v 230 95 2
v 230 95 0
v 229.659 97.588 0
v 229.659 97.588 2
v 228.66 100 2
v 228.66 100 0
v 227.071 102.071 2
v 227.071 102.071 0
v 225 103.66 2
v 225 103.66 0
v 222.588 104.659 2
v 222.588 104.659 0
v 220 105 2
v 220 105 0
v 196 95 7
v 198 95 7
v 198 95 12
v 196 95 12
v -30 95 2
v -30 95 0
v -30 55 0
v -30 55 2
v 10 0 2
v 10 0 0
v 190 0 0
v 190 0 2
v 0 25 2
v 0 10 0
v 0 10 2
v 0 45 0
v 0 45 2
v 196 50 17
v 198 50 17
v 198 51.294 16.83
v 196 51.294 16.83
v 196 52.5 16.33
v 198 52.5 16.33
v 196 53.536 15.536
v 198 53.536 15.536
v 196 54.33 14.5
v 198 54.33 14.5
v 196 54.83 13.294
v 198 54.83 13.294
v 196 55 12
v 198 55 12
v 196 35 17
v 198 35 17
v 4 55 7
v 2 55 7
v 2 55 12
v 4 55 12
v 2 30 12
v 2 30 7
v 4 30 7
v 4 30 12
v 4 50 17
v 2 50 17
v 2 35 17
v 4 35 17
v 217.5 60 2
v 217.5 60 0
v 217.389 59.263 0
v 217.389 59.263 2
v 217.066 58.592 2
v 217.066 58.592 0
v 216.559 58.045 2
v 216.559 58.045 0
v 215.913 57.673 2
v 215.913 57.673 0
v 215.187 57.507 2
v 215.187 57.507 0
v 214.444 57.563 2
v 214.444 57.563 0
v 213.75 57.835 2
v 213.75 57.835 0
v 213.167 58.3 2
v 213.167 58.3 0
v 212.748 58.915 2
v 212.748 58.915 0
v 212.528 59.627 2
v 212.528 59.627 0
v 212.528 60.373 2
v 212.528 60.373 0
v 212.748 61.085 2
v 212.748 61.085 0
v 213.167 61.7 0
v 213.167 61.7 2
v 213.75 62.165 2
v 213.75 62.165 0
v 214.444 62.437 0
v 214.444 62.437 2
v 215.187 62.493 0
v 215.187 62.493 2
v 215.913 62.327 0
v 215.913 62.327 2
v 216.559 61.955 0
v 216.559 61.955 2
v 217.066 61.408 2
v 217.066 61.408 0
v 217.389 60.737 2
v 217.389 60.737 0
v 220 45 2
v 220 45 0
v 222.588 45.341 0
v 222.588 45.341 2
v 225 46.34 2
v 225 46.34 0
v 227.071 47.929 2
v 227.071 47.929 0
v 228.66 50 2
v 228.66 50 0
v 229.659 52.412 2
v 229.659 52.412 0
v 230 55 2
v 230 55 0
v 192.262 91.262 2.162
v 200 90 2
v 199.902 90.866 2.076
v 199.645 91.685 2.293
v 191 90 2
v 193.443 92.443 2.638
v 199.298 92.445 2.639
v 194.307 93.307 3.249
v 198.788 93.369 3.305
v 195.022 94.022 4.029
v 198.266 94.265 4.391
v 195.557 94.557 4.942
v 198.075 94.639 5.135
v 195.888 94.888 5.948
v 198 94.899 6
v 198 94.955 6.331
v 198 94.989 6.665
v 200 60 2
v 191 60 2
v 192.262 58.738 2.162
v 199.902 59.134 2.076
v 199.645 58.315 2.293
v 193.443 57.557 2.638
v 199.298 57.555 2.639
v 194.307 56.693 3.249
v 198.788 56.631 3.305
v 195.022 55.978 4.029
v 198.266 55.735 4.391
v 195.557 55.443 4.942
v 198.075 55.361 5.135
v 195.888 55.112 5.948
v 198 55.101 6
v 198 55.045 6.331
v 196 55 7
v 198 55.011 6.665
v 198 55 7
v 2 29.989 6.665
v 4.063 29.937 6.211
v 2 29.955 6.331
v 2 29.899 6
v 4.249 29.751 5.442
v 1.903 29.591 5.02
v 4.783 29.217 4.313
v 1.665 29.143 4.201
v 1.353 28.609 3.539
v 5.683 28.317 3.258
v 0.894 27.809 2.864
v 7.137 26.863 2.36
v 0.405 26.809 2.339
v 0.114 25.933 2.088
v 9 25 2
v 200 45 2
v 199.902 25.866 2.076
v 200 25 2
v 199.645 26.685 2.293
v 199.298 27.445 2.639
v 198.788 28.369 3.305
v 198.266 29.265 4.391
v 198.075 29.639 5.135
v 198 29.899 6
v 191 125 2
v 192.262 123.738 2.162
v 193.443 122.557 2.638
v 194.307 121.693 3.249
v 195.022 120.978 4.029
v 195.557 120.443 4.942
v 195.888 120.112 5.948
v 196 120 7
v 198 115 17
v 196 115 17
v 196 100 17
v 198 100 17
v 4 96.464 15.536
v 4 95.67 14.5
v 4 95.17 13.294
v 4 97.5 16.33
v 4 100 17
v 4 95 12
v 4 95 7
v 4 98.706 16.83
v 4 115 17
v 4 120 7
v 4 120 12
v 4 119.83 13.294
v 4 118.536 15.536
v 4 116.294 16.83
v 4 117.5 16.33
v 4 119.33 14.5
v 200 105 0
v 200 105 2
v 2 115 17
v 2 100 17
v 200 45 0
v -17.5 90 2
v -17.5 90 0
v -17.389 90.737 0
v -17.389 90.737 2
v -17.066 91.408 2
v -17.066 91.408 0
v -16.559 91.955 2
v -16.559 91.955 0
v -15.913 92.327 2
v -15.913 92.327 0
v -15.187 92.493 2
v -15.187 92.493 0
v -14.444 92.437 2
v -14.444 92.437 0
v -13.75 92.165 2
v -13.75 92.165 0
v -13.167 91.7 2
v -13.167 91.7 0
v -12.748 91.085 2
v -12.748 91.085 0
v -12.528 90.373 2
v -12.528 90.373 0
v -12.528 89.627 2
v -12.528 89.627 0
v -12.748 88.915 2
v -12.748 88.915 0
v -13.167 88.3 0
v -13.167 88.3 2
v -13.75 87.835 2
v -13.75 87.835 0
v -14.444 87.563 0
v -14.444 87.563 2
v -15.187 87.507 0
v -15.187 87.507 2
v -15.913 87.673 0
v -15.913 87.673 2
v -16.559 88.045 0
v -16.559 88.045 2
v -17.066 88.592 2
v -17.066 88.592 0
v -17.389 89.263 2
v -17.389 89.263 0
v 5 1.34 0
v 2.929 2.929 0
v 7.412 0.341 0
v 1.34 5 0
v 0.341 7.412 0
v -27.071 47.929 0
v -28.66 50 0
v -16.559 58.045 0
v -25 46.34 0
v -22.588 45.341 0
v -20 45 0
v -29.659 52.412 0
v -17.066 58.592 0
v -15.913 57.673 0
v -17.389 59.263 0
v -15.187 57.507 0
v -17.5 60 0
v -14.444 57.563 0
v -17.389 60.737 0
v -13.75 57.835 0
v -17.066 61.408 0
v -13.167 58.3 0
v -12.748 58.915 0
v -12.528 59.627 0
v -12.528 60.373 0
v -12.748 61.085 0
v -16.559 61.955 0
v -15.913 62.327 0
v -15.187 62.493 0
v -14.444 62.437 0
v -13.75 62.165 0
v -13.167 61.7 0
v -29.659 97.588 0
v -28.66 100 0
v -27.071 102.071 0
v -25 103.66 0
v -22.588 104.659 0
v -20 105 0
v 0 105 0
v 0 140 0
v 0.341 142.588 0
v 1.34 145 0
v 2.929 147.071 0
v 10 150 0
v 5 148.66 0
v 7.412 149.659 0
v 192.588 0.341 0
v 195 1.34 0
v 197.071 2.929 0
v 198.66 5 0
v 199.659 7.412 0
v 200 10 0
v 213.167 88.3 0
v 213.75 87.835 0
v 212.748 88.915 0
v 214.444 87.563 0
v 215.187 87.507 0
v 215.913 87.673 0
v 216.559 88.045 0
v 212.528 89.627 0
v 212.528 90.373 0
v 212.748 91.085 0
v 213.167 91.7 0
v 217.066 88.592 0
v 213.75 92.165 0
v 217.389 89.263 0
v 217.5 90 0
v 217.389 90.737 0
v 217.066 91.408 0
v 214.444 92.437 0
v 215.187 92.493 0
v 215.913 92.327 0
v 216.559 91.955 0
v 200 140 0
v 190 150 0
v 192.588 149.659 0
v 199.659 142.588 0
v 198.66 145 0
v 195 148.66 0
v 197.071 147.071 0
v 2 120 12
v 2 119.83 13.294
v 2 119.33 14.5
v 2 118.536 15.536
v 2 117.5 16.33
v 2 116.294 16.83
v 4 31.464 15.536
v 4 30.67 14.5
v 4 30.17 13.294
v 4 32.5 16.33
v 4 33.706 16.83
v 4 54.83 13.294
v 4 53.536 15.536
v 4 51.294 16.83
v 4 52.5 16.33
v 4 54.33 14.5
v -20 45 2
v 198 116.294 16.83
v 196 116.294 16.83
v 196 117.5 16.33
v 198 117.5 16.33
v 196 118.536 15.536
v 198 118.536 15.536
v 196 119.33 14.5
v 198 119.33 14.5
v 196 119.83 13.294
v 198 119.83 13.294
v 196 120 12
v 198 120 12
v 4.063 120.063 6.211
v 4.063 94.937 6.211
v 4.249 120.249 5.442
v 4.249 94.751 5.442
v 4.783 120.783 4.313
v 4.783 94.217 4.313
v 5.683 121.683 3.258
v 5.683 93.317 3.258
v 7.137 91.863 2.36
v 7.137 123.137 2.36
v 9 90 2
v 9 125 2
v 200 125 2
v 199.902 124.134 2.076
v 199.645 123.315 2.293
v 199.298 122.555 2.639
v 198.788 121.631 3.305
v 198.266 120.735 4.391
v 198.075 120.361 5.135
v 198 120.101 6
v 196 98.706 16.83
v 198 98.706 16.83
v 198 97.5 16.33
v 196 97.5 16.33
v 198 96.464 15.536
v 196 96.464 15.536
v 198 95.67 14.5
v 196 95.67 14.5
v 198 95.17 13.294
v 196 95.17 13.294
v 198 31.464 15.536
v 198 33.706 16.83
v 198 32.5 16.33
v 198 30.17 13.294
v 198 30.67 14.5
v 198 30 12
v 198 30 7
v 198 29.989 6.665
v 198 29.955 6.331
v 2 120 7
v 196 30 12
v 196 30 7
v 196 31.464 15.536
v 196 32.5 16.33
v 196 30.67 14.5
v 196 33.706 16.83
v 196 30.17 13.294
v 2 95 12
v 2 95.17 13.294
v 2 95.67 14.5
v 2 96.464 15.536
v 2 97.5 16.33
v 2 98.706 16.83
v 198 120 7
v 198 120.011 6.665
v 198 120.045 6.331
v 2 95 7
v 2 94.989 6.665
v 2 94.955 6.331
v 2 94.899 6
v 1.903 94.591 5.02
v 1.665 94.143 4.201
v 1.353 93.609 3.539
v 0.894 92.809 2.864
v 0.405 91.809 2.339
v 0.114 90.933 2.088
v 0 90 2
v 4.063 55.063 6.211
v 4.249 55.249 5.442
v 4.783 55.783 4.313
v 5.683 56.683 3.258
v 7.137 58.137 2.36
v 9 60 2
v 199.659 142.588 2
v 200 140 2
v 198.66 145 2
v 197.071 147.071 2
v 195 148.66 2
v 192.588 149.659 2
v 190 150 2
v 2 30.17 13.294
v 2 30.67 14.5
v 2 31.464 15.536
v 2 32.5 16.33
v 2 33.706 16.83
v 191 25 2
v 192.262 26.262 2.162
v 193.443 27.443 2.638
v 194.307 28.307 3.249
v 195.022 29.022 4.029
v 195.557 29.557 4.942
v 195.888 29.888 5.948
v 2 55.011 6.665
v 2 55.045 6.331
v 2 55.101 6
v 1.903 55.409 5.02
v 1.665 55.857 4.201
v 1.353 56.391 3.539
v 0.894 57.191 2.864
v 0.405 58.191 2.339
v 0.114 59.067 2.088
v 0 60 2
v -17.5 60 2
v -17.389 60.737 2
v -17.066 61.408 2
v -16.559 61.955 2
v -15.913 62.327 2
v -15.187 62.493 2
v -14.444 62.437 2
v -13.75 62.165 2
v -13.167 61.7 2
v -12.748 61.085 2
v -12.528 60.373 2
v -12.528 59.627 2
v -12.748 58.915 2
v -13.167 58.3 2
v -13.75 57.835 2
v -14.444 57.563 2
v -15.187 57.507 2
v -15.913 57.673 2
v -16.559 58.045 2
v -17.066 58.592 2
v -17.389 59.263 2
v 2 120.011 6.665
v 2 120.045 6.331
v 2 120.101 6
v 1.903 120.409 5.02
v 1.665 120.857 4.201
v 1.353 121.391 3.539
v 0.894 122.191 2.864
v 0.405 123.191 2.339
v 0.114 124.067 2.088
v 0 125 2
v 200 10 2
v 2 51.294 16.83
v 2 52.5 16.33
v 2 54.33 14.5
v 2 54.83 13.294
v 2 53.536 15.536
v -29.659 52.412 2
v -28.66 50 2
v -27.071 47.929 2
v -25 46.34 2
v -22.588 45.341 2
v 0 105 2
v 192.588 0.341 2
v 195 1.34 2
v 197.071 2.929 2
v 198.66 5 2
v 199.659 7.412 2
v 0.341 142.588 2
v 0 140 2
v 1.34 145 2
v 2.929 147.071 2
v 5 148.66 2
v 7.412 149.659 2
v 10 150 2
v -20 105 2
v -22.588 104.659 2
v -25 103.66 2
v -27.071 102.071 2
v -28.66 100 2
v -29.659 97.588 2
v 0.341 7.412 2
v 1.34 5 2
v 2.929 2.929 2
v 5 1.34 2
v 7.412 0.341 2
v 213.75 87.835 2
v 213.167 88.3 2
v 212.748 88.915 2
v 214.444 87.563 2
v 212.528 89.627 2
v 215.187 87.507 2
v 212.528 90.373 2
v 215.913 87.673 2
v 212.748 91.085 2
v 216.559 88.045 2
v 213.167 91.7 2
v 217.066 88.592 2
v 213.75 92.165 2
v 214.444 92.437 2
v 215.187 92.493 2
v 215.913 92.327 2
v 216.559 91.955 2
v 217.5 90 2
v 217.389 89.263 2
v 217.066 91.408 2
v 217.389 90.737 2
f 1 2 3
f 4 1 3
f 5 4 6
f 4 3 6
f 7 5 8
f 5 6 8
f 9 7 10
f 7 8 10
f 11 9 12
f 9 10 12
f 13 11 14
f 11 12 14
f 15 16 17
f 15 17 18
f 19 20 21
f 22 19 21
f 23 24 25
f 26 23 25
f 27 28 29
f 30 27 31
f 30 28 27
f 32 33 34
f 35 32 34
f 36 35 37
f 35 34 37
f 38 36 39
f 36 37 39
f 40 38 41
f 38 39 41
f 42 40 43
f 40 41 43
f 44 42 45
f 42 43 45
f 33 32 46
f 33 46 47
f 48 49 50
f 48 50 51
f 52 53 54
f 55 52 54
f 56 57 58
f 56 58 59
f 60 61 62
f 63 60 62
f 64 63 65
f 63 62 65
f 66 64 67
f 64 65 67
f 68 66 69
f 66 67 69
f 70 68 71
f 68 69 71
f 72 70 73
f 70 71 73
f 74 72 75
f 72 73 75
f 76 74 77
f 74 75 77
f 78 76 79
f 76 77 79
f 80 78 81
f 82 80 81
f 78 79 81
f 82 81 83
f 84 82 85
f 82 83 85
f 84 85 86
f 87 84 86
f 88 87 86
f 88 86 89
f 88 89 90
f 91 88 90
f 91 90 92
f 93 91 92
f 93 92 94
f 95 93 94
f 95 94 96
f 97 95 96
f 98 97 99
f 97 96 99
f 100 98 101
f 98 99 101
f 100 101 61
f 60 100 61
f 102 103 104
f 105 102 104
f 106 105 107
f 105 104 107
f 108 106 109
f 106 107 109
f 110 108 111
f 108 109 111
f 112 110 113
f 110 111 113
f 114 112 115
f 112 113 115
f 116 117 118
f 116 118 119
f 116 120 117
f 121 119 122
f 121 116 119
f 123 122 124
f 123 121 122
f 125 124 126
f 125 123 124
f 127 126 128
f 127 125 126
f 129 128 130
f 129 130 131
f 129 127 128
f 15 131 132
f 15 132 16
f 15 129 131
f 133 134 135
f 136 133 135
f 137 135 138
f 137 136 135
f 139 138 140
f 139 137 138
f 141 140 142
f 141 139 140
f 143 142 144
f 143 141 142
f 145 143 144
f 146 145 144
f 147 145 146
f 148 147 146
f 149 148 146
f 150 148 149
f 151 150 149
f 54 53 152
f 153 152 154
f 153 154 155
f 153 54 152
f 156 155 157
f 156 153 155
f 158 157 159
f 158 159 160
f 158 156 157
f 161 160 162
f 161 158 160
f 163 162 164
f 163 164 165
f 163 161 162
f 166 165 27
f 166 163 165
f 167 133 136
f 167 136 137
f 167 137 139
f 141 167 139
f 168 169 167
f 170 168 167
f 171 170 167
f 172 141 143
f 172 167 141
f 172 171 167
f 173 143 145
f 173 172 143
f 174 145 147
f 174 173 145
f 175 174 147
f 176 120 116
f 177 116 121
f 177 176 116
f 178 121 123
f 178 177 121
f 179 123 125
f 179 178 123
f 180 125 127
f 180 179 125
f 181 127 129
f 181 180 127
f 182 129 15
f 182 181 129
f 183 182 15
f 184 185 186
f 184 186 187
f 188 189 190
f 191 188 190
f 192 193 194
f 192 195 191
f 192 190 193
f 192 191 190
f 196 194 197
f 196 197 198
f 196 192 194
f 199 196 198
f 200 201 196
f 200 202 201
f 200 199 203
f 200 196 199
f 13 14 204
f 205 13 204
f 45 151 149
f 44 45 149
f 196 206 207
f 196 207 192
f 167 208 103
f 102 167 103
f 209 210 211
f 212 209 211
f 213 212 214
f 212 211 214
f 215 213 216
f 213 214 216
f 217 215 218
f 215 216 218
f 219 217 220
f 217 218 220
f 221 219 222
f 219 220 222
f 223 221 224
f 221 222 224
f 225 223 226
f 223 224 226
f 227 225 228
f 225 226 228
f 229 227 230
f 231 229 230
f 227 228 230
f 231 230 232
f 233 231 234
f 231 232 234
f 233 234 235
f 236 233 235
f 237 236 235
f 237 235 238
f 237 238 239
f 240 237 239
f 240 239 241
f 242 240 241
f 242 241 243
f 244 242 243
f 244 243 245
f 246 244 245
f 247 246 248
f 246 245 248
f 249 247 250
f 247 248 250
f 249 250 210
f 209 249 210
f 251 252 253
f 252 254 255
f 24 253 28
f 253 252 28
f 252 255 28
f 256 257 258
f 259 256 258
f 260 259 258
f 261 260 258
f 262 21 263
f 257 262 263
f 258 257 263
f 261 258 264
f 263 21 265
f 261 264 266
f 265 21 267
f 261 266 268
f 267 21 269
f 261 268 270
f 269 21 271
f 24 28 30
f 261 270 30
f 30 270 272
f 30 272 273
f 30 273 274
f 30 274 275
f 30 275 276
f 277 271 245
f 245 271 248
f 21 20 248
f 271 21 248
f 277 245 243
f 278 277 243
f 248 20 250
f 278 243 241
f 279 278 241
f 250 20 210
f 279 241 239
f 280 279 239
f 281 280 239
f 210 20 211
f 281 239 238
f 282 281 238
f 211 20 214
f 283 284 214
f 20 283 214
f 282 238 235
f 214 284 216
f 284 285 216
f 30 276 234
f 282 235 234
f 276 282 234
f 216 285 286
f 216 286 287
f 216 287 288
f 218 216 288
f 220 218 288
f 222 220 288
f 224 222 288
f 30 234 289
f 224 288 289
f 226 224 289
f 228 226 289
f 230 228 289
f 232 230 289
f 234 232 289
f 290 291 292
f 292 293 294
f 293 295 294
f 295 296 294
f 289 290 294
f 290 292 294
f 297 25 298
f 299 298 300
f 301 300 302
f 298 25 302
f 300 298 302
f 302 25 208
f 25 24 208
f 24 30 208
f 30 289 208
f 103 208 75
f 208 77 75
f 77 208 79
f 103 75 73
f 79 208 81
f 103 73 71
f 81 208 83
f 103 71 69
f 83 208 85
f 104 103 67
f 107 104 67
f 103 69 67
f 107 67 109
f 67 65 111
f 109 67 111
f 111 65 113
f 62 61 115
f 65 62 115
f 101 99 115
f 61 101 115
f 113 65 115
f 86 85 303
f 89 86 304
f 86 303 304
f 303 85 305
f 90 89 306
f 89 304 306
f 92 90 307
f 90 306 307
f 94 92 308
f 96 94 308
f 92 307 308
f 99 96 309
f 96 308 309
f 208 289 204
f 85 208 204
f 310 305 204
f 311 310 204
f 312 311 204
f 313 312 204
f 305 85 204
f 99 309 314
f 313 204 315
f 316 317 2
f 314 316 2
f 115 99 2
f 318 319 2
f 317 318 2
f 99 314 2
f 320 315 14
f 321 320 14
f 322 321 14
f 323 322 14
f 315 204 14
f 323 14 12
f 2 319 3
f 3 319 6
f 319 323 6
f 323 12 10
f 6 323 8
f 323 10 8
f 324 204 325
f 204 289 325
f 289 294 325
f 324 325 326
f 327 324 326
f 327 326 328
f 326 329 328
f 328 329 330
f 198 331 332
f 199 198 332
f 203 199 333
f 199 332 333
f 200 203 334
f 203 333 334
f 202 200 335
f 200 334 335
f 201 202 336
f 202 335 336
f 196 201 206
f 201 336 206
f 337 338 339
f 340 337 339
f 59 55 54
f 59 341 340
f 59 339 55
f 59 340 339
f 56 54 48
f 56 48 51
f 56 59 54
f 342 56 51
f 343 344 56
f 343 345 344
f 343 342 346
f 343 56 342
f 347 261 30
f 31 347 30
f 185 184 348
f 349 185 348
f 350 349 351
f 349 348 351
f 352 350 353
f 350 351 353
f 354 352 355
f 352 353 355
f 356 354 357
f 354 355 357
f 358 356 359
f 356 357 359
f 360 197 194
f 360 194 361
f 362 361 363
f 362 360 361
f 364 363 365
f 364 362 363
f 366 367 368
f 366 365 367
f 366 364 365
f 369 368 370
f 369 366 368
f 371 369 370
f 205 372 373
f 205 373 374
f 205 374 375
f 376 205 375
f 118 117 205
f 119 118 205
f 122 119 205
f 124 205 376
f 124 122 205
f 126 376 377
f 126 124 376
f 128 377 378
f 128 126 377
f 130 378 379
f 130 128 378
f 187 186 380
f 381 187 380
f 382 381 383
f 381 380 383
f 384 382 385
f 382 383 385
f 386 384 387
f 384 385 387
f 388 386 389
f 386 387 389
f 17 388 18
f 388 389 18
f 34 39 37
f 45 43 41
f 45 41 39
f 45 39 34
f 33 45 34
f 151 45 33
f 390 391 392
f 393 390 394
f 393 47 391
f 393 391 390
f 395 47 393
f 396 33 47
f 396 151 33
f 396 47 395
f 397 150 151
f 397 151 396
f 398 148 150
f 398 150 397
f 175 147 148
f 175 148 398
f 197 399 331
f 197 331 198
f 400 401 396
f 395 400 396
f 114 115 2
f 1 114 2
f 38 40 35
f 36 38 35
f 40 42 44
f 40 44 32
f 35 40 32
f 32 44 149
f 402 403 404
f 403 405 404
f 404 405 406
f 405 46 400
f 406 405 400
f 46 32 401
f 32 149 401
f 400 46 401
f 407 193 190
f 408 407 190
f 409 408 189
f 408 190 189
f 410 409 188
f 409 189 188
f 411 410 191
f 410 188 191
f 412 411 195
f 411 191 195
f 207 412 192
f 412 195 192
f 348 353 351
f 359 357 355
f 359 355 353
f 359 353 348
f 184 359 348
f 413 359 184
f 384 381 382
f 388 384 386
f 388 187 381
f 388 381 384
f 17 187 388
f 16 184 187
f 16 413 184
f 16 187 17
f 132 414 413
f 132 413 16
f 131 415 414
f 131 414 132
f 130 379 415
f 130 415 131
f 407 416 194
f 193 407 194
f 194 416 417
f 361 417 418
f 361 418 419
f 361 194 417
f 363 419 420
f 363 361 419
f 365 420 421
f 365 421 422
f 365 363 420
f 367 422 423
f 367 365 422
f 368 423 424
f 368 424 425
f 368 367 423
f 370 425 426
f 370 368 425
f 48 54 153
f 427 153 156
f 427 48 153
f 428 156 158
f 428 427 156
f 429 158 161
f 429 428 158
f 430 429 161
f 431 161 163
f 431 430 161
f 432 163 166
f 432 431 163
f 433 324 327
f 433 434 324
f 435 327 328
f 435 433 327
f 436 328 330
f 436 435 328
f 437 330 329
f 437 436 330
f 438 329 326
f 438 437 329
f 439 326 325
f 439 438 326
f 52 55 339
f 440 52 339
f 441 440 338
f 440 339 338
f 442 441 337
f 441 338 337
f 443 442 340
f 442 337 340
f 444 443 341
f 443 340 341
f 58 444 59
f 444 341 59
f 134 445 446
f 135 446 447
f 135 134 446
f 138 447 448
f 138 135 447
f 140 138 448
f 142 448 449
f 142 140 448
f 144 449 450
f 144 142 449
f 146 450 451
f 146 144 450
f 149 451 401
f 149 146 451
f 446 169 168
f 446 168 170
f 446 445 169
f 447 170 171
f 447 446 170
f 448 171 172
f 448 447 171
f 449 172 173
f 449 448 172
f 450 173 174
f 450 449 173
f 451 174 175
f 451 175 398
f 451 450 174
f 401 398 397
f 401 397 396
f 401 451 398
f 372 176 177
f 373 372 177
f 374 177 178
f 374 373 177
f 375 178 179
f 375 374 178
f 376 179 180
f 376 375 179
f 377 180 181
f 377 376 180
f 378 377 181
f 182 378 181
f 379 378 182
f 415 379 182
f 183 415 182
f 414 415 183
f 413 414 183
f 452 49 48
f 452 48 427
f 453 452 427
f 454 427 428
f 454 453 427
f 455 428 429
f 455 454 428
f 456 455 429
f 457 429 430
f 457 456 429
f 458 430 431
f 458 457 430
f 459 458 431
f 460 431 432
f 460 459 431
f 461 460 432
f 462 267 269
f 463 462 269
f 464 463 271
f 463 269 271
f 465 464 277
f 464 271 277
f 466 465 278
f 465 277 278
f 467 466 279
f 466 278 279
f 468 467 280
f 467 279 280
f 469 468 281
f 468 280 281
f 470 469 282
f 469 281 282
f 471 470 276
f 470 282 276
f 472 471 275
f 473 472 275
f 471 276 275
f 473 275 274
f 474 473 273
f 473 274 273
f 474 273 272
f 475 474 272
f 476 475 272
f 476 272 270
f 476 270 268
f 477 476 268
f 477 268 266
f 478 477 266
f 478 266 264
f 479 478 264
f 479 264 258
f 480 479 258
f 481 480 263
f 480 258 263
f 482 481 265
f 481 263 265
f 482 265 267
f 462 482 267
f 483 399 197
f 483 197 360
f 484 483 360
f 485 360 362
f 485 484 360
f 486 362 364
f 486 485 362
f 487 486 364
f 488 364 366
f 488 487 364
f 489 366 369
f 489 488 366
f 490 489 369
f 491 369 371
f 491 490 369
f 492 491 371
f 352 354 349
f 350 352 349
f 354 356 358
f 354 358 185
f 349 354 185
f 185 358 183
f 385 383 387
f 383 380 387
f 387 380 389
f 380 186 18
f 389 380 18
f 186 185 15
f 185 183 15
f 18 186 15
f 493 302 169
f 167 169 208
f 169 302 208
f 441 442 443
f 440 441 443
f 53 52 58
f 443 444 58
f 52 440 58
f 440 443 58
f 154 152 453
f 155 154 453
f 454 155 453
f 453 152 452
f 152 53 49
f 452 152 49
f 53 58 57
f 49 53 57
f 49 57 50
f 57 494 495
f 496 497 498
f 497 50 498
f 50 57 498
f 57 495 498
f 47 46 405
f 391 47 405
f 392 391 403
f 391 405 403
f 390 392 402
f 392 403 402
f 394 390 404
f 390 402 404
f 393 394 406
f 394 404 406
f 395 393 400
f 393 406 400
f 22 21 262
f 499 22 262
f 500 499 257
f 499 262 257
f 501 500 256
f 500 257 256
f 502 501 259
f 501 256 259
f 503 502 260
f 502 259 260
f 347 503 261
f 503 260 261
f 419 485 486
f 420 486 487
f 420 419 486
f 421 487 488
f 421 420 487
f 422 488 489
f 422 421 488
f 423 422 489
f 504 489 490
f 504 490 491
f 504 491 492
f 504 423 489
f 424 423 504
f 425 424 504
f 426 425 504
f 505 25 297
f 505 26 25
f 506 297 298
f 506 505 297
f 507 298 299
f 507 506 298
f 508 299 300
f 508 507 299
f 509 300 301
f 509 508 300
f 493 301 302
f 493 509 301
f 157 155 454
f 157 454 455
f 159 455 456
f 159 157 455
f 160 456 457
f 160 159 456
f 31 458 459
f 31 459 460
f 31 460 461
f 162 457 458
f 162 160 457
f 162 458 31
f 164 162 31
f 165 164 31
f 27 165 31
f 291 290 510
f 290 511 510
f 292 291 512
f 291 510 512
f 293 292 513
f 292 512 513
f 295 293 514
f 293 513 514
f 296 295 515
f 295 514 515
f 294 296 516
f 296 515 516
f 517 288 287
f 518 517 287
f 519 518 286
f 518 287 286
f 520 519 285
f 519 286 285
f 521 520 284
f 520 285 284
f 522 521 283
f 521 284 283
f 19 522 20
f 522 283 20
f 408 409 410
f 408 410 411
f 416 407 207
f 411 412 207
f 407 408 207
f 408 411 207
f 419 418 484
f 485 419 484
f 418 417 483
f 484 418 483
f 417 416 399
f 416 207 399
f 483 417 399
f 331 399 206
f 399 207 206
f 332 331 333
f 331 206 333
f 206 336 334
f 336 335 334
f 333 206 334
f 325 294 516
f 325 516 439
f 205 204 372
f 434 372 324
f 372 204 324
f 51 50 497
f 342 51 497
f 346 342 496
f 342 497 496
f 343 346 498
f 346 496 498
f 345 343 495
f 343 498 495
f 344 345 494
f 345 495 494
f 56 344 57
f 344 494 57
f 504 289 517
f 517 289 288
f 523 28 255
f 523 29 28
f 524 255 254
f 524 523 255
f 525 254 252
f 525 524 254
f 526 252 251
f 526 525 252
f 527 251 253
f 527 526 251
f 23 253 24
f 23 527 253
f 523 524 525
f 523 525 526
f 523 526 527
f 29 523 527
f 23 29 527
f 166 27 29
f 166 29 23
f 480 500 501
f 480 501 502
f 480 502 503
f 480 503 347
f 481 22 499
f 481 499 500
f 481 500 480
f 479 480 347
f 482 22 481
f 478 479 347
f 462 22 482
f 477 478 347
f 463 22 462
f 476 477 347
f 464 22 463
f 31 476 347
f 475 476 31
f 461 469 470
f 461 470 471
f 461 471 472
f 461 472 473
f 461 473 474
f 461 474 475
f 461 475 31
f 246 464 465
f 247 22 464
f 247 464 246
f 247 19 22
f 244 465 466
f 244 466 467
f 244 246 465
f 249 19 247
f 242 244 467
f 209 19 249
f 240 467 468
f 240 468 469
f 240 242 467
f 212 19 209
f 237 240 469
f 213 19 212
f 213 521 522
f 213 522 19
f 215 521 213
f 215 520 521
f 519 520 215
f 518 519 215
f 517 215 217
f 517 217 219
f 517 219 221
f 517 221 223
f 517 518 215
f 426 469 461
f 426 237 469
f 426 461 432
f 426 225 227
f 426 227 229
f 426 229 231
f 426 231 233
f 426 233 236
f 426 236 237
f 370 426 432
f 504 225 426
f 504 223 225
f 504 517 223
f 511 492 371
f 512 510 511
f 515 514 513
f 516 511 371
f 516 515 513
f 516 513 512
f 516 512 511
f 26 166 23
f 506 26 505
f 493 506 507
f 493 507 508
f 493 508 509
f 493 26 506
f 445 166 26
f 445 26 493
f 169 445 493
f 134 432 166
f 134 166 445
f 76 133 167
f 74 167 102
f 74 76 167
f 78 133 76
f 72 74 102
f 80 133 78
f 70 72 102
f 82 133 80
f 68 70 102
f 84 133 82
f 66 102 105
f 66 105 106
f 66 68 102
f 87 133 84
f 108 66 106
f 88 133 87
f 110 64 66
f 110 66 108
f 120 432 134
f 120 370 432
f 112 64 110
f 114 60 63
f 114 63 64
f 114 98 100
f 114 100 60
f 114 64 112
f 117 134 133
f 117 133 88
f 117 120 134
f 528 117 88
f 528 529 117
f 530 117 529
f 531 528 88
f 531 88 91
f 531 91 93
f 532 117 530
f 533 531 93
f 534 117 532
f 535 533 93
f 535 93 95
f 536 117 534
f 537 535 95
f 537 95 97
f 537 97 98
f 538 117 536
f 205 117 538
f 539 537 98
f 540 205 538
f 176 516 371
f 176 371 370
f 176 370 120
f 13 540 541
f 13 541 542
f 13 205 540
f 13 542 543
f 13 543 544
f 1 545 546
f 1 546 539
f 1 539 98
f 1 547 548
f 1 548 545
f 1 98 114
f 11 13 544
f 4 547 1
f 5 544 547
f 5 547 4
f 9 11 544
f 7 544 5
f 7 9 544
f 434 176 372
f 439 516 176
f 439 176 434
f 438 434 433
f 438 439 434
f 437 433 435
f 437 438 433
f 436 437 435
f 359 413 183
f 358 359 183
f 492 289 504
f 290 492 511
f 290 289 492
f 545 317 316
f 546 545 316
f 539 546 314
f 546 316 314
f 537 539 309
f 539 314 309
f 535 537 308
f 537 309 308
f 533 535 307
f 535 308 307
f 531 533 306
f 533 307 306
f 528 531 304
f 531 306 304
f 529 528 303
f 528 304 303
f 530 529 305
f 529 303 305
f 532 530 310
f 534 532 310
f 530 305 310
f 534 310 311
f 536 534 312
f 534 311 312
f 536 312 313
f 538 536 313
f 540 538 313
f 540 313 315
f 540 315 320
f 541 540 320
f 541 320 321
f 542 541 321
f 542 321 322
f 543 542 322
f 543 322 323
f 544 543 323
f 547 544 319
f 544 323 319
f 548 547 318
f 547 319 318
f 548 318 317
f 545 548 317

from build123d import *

# Parameters (mm, degrees)
ESQUISSE1_W             = 200
ESQUISSE1_H             = 150
BOSS_EXTRU_1_DEPTH      = 2
CONG_1_R                = 10
ESQUISSE2_W             = 2
ESQUISSE2_H             = 25
BOSS_EXTRU_2_DEPTH      = 15
CONG_2_R                = 5
ESQUISSE3_W             = 4.5
ESQUISSE3_H             = 30
ENL_V_MAT_EXTRU_1_DEPTH = 15
ESQUISSE4_R             = 2.5
BOSS_EXTRU_3_DEPTH      = 2


with BuildPart() as part:
    # Esquisse1 → Boss.-Extru.1 (new body)
    with BuildSketch(Plane.XY):
        with Locations((100, 75)):
            Rectangle(ESQUISSE1_W, ESQUISSE1_H)
    extrude(amount=BOSS_EXTRU_1_DEPTH)

    # Congé1
    cong_1_edges = [part.edges().sort_by_distance(p)[0] for p in [
        (0, 150, 1),
        (200, 150, 1),
        (200, 0, 1),
        (0, 0, 1),
    ]]
    fillet(cong_1_edges, radius=CONG_1_R)

    # Esquisse2 → Boss.-Extru.2 (add)
    with BuildSketch(Plane.XY.offset(2)):
        with Locations((3, 107.5)):
            Rectangle(ESQUISSE2_W, ESQUISSE2_H)
        with Locations((3, 42.5)):
            Rectangle(ESQUISSE2_W, ESQUISSE2_H)
        with Locations((197, 42.5)):
            Rectangle(ESQUISSE2_W, ESQUISSE2_H)
        with Locations((197, 107.5)):
            Rectangle(ESQUISSE2_W, ESQUISSE2_H)
    extrude(amount=BOSS_EXTRU_2_DEPTH)

    # Congé2
    # the kernel refuses this fillet: 5 mm, written as the material it adds along each edge
    with BuildSketch(Plane(origin=(2, 30, 2), x_dir=(-1, 0, 0), z_dir=(0, 1, 0)), Plane(origin=(2, 95, 2), x_dir=(-1, 0, 0), z_dir=(0, 1, 0))) as cong_2_piece_1:
        with BuildLine():
            CenterArc((5, 4), CONG_2_R, 180, 53.130102354)
            Line((0, 4), (0, 0))
            Line((0, 0), (2, 0))
        make_face()
    extrude(amount=25)
    with BuildSketch(Plane(origin=(4, 30, 2), x_dir=(0, -1, 0), z_dir=(-1, 0, 0)), Plane(origin=(2, 55, 2), x_dir=(0, 1, 0), z_dir=(1, 0, 0)), Plane(origin=(4, 95, 2), x_dir=(0, -1, 0), z_dir=(-1, 0, 0)), Plane(origin=(2, 120, 2), x_dir=(0, 1, 0), z_dir=(1, 0, 0))) as cong_2_piece_2:
        with BuildLine():
            CenterArc((CONG_2_R, CONG_2_R), CONG_2_R, 180, 90)
            Line((0, CONG_2_R), (0, 0))
            Line((0, 0), (CONG_2_R, 0))
        make_face()
    extrude(amount=2)
    with BuildSketch(Plane(origin=(4, 55, 2), x_dir=(1, 0, 0), z_dir=(0, -1, 0)), Plane(origin=(4, 120, 2), x_dir=(1, 0, 0), z_dir=(0, -1, 0))) as cong_2_piece_3:
        with BuildLine():
            CenterArc((CONG_2_R, CONG_2_R), CONG_2_R, 180, 90)
            Line((0, CONG_2_R), (0, 0))
            Line((0, 0), (CONG_2_R, 0))
        make_face()
    extrude(amount=25)
    with BuildSketch(Plane(origin=(198, 95, 2), x_dir=(1, 0, 0), z_dir=(0, 1, 0)), Plane(origin=(198, 30, 2), x_dir=(1, 0, 0), z_dir=(0, 1, 0))) as cong_2_piece_4:
        with BuildLine():
            CenterArc((5, -4), CONG_2_R, 126.869897646, 53.130102354)
            Line((0, -4), (0, 0))
            Line((0, 0), (2, 0))
        make_face()
    extrude(amount=25)
    with BuildSketch(Plane(origin=(198, 120, 2), x_dir=(0, 1, 0), z_dir=(-1, 0, 0)), Plane(origin=(196, 95, 2), x_dir=(0, -1, 0), z_dir=(1, 0, 0)), Plane(origin=(196, 30, 2), x_dir=(0, -1, 0), z_dir=(1, 0, 0)), Plane(origin=(198, 55, 2), x_dir=(0, 1, 0), z_dir=(-1, 0, 0))) as cong_2_piece_5:
        with BuildLine():
            CenterArc((CONG_2_R, -CONG_2_R), CONG_2_R, 90, 90)
            Line((0, -CONG_2_R), (0, 0))
            Line((0, 0), (CONG_2_R, 0))
        make_face()
    extrude(amount=2)
    with BuildSketch(Plane(origin=(196, 120, 2), x_dir=(-1, 0, 0), z_dir=(0, -1, 0)), Plane(origin=(196, 55, 2), x_dir=(-1, 0, 0), z_dir=(0, -1, 0))) as cong_2_piece_6:
        with BuildLine():
            CenterArc((CONG_2_R, -CONG_2_R), CONG_2_R, 90, 90)
            Line((0, -CONG_2_R), (0, 0))
            Line((0, 0), (CONG_2_R, 0))
        make_face()
    extrude(amount=25)
    with BuildSketch(Plane(origin=(2, 20, 2), x_dir=(-1, 0, 0), z_dir=(0, 1, 0))) as cong_2_piece_7a_section:
        with BuildLine():
            CenterArc((5, 4), CONG_2_R, 180, 53.130102354)
            Line((0, 4), (0, 0))
            Line((0, 0), (2, 0))
        make_face()
    cong_2_piece_7a = extrude(amount=35, mode=Mode.PRIVATE)
    cong_2_piece_7a = split(cong_2_piece_7a, bisect_by=Plane(origin=(2, 30, 2), z_dir=(0, -1, 0)), keep=Keep.TOP, mode=Mode.PRIVATE)
    with BuildSketch(Plane(origin=(4, 30, 2), x_dir=(0, -1, 0), z_dir=(-1, 0, 0))) as cong_2_piece_7b_section:
        with BuildLine():
            CenterArc((CONG_2_R, CONG_2_R), CONG_2_R, 180, 90)
            Line((0, CONG_2_R), (0, 0))
            Line((0, 0), (CONG_2_R, 0))
        make_face()
    cong_2_piece_7b = extrude(amount=14.5, mode=Mode.PRIVATE)
    cong_2_piece_7b = split(cong_2_piece_7b, bisect_by=Plane(origin=(0, 30, 2), z_dir=(1, 0, 0)), keep=Keep.TOP, mode=Mode.PRIVATE)
    cong_2_piece_7b = split(cong_2_piece_7b, bisect_by=Plane(origin=(2, 30, 2), z_dir=(-1, 0, 0)), keep=Keep.TOP, mode=Mode.PRIVATE)
    cong_2_piece_7 = cong_2_piece_7a & cong_2_piece_7b
    add(cong_2_piece_7)
    with BuildSketch(Plane(origin=(2, 30, 2), x_dir=(-1, 0, 0), z_dir=(0, 1, 0))) as cong_2_piece_8a_section:
        with BuildLine():
            CenterArc((5, 4), CONG_2_R, 180, 53.130102354)
            Line((0, 4), (0, 0))
            Line((0, 0), (2, 0))
        make_face()
    cong_2_piece_8a = extrude(amount=35, mode=Mode.PRIVATE)
    cong_2_piece_8a = split(cong_2_piece_8a, bisect_by=Plane(origin=(2, 55, 2), z_dir=(0, 1, 0)), keep=Keep.TOP, mode=Mode.PRIVATE)
    with BuildSketch(Plane(origin=(-10.5, 55, 2), x_dir=(0, 1, 0), z_dir=(1, 0, 0))) as cong_2_piece_8b_section:
        with BuildLine():
            CenterArc((CONG_2_R, CONG_2_R), CONG_2_R, 180, 90)
            Line((0, CONG_2_R), (0, 0))
            Line((0, 0), (CONG_2_R, 0))
        make_face()
    cong_2_piece_8b = extrude(amount=14.5, mode=Mode.PRIVATE)
    cong_2_piece_8b = split(cong_2_piece_8b, bisect_by=Plane(origin=(0, 55, 2), z_dir=(1, 0, 0)), keep=Keep.TOP, mode=Mode.PRIVATE)
    cong_2_piece_8b = split(cong_2_piece_8b, bisect_by=Plane(origin=(2, 55, 2), z_dir=(-1, 0, 0)), keep=Keep.TOP, mode=Mode.PRIVATE)
    cong_2_piece_8 = cong_2_piece_8a & cong_2_piece_8b
    add(cong_2_piece_8)
    with BuildSketch(Plane(origin=(16.5, 30, 2), x_dir=(0, -1, 0), z_dir=(-1, 0, 0))) as cong_2_piece_9a_section:
        with BuildLine():
            CenterArc((CONG_2_R, CONG_2_R), CONG_2_R, 180, 90)
            Line((0, CONG_2_R), (0, 0))
            Line((0, 0), (CONG_2_R, 0))
        make_face()
    cong_2_piece_9a = extrude(amount=14.5, mode=Mode.PRIVATE)
    cong_2_piece_9a = split(cong_2_piece_9a, bisect_by=Plane(origin=(4, 30, 2), z_dir=(1, 0, 0)), keep=Keep.TOP, mode=Mode.PRIVATE)
    with BuildSketch(Plane(origin=(4, 55, 2), x_dir=(1, 0, 0), z_dir=(0, -1, 0))) as cong_2_piece_9b_section:
        with BuildLine():
            CenterArc((CONG_2_R, CONG_2_R), CONG_2_R, 180, 90)
            Line((0, CONG_2_R), (0, 0))
            Line((0, 0), (CONG_2_R, 0))
        make_face()
    cong_2_piece_9b = extrude(amount=37.5, mode=Mode.PRIVATE)
    cong_2_piece_9b = split(cong_2_piece_9b, bisect_by=Plane(origin=(4, 30, 2), z_dir=(0, -1, 0)), keep=Keep.TOP, mode=Mode.PRIVATE)
    cong_2_piece_9 = cong_2_piece_9a & cong_2_piece_9b
    add(cong_2_piece_9)
    with BuildSketch(Plane(origin=(4, 67.5, 2), x_dir=(1, 0, 0), z_dir=(0, -1, 0))) as cong_2_piece_10a_section:
        with BuildLine():
            CenterArc((CONG_2_R, CONG_2_R), CONG_2_R, 180, 90)
            Line((0, CONG_2_R), (0, 0))
            Line((0, 0), (CONG_2_R, 0))
        make_face()
    cong_2_piece_10a = extrude(amount=37.5, mode=Mode.PRIVATE)
    cong_2_piece_10a = split(cong_2_piece_10a, bisect_by=Plane(origin=(4, 55, 2), z_dir=(0, 1, 0)), keep=Keep.TOP, mode=Mode.PRIVATE)
    with BuildSketch(Plane(origin=(2, 55, 2), x_dir=(0, 1, 0), z_dir=(1, 0, 0))) as cong_2_piece_10b_section:
        with BuildLine():
            CenterArc((CONG_2_R, CONG_2_R), CONG_2_R, 180, 90)
            Line((0, CONG_2_R), (0, 0))
            Line((0, 0), (CONG_2_R, 0))
        make_face()
    cong_2_piece_10b = extrude(amount=14.5, mode=Mode.PRIVATE)
    cong_2_piece_10b = split(cong_2_piece_10b, bisect_by=Plane(origin=(4, 55, 2), z_dir=(1, 0, 0)), keep=Keep.TOP, mode=Mode.PRIVATE)
    cong_2_piece_10 = cong_2_piece_10a & cong_2_piece_10b
    add(cong_2_piece_10)
    with BuildSketch(Plane(origin=(196, 95, 2), x_dir=(0, -1, 0), z_dir=(1, 0, 0))) as cong_2_piece_11a_section:
        with BuildLine():
            CenterArc((CONG_2_R, -CONG_2_R), CONG_2_R, 90, 90)
            Line((0, -CONG_2_R), (0, 0))
            Line((0, 0), (CONG_2_R, 0))
        make_face()
    cong_2_piece_11a = extrude(amount=14.5, mode=Mode.PRIVATE)
    cong_2_piece_11a = split(cong_2_piece_11a, bisect_by=Plane(origin=(200, 95, 2), z_dir=(-1, 0, 0)), keep=Keep.TOP, mode=Mode.PRIVATE)
    cong_2_piece_11a = split(cong_2_piece_11a, bisect_by=Plane(origin=(198, 95, 2), z_dir=(1, 0, 0)), keep=Keep.TOP, mode=Mode.PRIVATE)
    with BuildSketch(Plane(origin=(198, 85, 2), x_dir=(1, 0, 0), z_dir=(0, 1, 0))) as cong_2_piece_11b_section:
        with BuildLine():
            CenterArc((5, -4), CONG_2_R, 126.869897646, 53.130102354)
            Line((0, -4), (0, 0))
            Line((0, 0), (2, 0))
        make_face()
    cong_2_piece_11b = extrude(amount=35, mode=Mode.PRIVATE)
    cong_2_piece_11b = split(cong_2_piece_11b, bisect_by=Plane(origin=(198, 95, 2), z_dir=(0, -1, 0)), keep=Keep.TOP, mode=Mode.PRIVATE)
    cong_2_piece_11 = cong_2_piece_11a & cong_2_piece_11b
    add(cong_2_piece_11)
    with BuildSketch(Plane(origin=(198, 95, 2), x_dir=(1, 0, 0), z_dir=(0, 1, 0))) as cong_2_piece_12a_section:
        with BuildLine():
            CenterArc((5, -4), CONG_2_R, 126.869897646, 53.130102354)
            Line((0, -4), (0, 0))
            Line((0, 0), (2, 0))
        make_face()
    cong_2_piece_12a = extrude(amount=35, mode=Mode.PRIVATE)
    cong_2_piece_12a = split(cong_2_piece_12a, bisect_by=Plane(origin=(198, 120, 2), z_dir=(0, 1, 0)), keep=Keep.TOP, mode=Mode.PRIVATE)
    with BuildSketch(Plane(origin=(210.5, 120, 2), x_dir=(0, 1, 0), z_dir=(-1, 0, 0))) as cong_2_piece_12b_section:
        with BuildLine():
            CenterArc((CONG_2_R, -CONG_2_R), CONG_2_R, 90, 90)
            Line((0, -CONG_2_R), (0, 0))
            Line((0, 0), (CONG_2_R, 0))
        make_face()
    cong_2_piece_12b = extrude(amount=14.5, mode=Mode.PRIVATE)
    cong_2_piece_12b = split(cong_2_piece_12b, bisect_by=Plane(origin=(200, 120, 2), z_dir=(-1, 0, 0)), keep=Keep.TOP, mode=Mode.PRIVATE)
    cong_2_piece_12b = split(cong_2_piece_12b, bisect_by=Plane(origin=(198, 120, 2), z_dir=(1, 0, 0)), keep=Keep.TOP, mode=Mode.PRIVATE)
    cong_2_piece_12 = cong_2_piece_12a & cong_2_piece_12b
    add(cong_2_piece_12)
    with BuildSketch(Plane(origin=(196, 132.5, 2), x_dir=(-1, 0, 0), z_dir=(0, -1, 0))) as cong_2_piece_13a_section:
        with BuildLine():
            CenterArc((CONG_2_R, -CONG_2_R), CONG_2_R, 90, 90)
            Line((0, -CONG_2_R), (0, 0))
            Line((0, 0), (CONG_2_R, 0))
        make_face()
    cong_2_piece_13a = extrude(amount=37.5, mode=Mode.PRIVATE)
    cong_2_piece_13a = split(cong_2_piece_13a, bisect_by=Plane(origin=(196, 120, 2), z_dir=(0, 1, 0)), keep=Keep.TOP, mode=Mode.PRIVATE)
    with BuildSketch(Plane(origin=(198, 120, 2), x_dir=(0, 1, 0), z_dir=(-1, 0, 0))) as cong_2_piece_13b_section:
        with BuildLine():
            CenterArc((CONG_2_R, -CONG_2_R), CONG_2_R, 90, 90)
            Line((0, -CONG_2_R), (0, 0))
            Line((0, 0), (CONG_2_R, 0))
        make_face()
    cong_2_piece_13b = extrude(amount=14.5, mode=Mode.PRIVATE)
    cong_2_piece_13b = split(cong_2_piece_13b, bisect_by=Plane(origin=(196, 120, 2), z_dir=(-1, 0, 0)), keep=Keep.TOP, mode=Mode.PRIVATE)
    cong_2_piece_13 = cong_2_piece_13a & cong_2_piece_13b
    add(cong_2_piece_13)
    with BuildSketch(Plane(origin=(196, 120, 2), x_dir=(-1, 0, 0), z_dir=(0, -1, 0))) as cong_2_piece_14a_section:
        with BuildLine():
            CenterArc((CONG_2_R, -CONG_2_R), CONG_2_R, 90, 90)
            Line((0, -CONG_2_R), (0, 0))
            Line((0, 0), (CONG_2_R, 0))
        make_face()
    cong_2_piece_14a = extrude(amount=37.5, mode=Mode.PRIVATE)
    cong_2_piece_14a = split(cong_2_piece_14a, bisect_by=Plane(origin=(196, 95, 2), z_dir=(0, -1, 0)), keep=Keep.TOP, mode=Mode.PRIVATE)
    with BuildSketch(Plane(origin=(183.5, 95, 2), x_dir=(0, -1, 0), z_dir=(1, 0, 0))) as cong_2_piece_14b_section:
        with BuildLine():
            CenterArc((CONG_2_R, -CONG_2_R), CONG_2_R, 90, 90)
            Line((0, -CONG_2_R), (0, 0))
            Line((0, 0), (CONG_2_R, 0))
        make_face()
    cong_2_piece_14b = extrude(amount=14.5, mode=Mode.PRIVATE)
    cong_2_piece_14b = split(cong_2_piece_14b, bisect_by=Plane(origin=(196, 95, 2), z_dir=(-1, 0, 0)), keep=Keep.TOP, mode=Mode.PRIVATE)
    cong_2_piece_14 = cong_2_piece_14a & cong_2_piece_14b
    add(cong_2_piece_14)
    with BuildSketch(Plane(origin=(196, 55, 2), x_dir=(-1, 0, 0), z_dir=(0, -1, 0))) as cong_2_piece_15a_section:
        with BuildLine():
            CenterArc((CONG_2_R, -CONG_2_R), CONG_2_R, 90, 90)
            Line((0, -CONG_2_R), (0, 0))
            Line((0, 0), (CONG_2_R, 0))
        make_face()
    cong_2_piece_15a = extrude(amount=37.5, mode=Mode.PRIVATE)
    cong_2_piece_15a = split(cong_2_piece_15a, bisect_by=Plane(origin=(196, 30, 2), z_dir=(0, -1, 0)), keep=Keep.TOP, mode=Mode.PRIVATE)
    with BuildSketch(Plane(origin=(183.5, 30, 2), x_dir=(0, -1, 0), z_dir=(1, 0, 0))) as cong_2_piece_15b_section:
        with BuildLine():
            CenterArc((CONG_2_R, -CONG_2_R), CONG_2_R, 90, 90)
            Line((0, -CONG_2_R), (0, 0))
            Line((0, 0), (CONG_2_R, 0))
        make_face()
    cong_2_piece_15b = extrude(amount=14.5, mode=Mode.PRIVATE)
    cong_2_piece_15b = split(cong_2_piece_15b, bisect_by=Plane(origin=(196, 30, 2), z_dir=(-1, 0, 0)), keep=Keep.TOP, mode=Mode.PRIVATE)
    cong_2_piece_15 = cong_2_piece_15a & cong_2_piece_15b
    add(cong_2_piece_15)
    with BuildSketch(Plane(origin=(198, 20, 2), x_dir=(1, 0, 0), z_dir=(0, 1, 0))) as cong_2_piece_16a_section:
        with BuildLine():
            CenterArc((5, -4), CONG_2_R, 126.869897646, 53.130102354)
            Line((0, -4), (0, 0))
            Line((0, 0), (2, 0))
        make_face()
    cong_2_piece_16a = extrude(amount=35, mode=Mode.PRIVATE)
    cong_2_piece_16a = split(cong_2_piece_16a, bisect_by=Plane(origin=(198, 30, 2), z_dir=(0, -1, 0)), keep=Keep.TOP, mode=Mode.PRIVATE)
    with BuildSketch(Plane(origin=(196, 30, 2), x_dir=(0, -1, 0), z_dir=(1, 0, 0))) as cong_2_piece_16b_section:
        with BuildLine():
            CenterArc((CONG_2_R, -CONG_2_R), CONG_2_R, 90, 90)
            Line((0, -CONG_2_R), (0, 0))
            Line((0, 0), (CONG_2_R, 0))
        make_face()
    cong_2_piece_16b = extrude(amount=14.5, mode=Mode.PRIVATE)
    cong_2_piece_16b = split(cong_2_piece_16b, bisect_by=Plane(origin=(200, 30, 2), z_dir=(-1, 0, 0)), keep=Keep.TOP, mode=Mode.PRIVATE)
    cong_2_piece_16b = split(cong_2_piece_16b, bisect_by=Plane(origin=(198, 30, 2), z_dir=(1, 0, 0)), keep=Keep.TOP, mode=Mode.PRIVATE)
    cong_2_piece_16 = cong_2_piece_16a & cong_2_piece_16b
    add(cong_2_piece_16)
    with BuildSketch(Plane(origin=(198, 30, 2), x_dir=(1, 0, 0), z_dir=(0, 1, 0))) as cong_2_piece_17a_section:
        with BuildLine():
            CenterArc((5, -4), CONG_2_R, 126.869897646, 53.130102354)
            Line((0, -4), (0, 0))
            Line((0, 0), (2, 0))
        make_face()
    cong_2_piece_17a = extrude(amount=35, mode=Mode.PRIVATE)
    cong_2_piece_17a = split(cong_2_piece_17a, bisect_by=Plane(origin=(198, 55, 2), z_dir=(0, 1, 0)), keep=Keep.TOP, mode=Mode.PRIVATE)
    with BuildSketch(Plane(origin=(210.5, 55, 2), x_dir=(0, 1, 0), z_dir=(-1, 0, 0))) as cong_2_piece_17b_section:
        with BuildLine():
            CenterArc((CONG_2_R, -CONG_2_R), CONG_2_R, 90, 90)
            Line((0, -CONG_2_R), (0, 0))
            Line((0, 0), (CONG_2_R, 0))
        make_face()
    cong_2_piece_17b = extrude(amount=14.5, mode=Mode.PRIVATE)
    cong_2_piece_17b = split(cong_2_piece_17b, bisect_by=Plane(origin=(200, 55, 2), z_dir=(-1, 0, 0)), keep=Keep.TOP, mode=Mode.PRIVATE)
    cong_2_piece_17b = split(cong_2_piece_17b, bisect_by=Plane(origin=(198, 55, 2), z_dir=(1, 0, 0)), keep=Keep.TOP, mode=Mode.PRIVATE)
    cong_2_piece_17 = cong_2_piece_17a & cong_2_piece_17b
    add(cong_2_piece_17)
    with BuildSketch(Plane(origin=(198, 55, 2), x_dir=(0, 1, 0), z_dir=(-1, 0, 0))) as cong_2_piece_18a_section:
        with BuildLine():
            CenterArc((CONG_2_R, -CONG_2_R), CONG_2_R, 90, 90)
            Line((0, -CONG_2_R), (0, 0))
            Line((0, 0), (CONG_2_R, 0))
        make_face()
    cong_2_piece_18a = extrude(amount=14.5, mode=Mode.PRIVATE)
    cong_2_piece_18a = split(cong_2_piece_18a, bisect_by=Plane(origin=(196, 55, 2), z_dir=(-1, 0, 0)), keep=Keep.TOP, mode=Mode.PRIVATE)
    with BuildSketch(Plane(origin=(196, 67.5, 2), x_dir=(-1, 0, 0), z_dir=(0, -1, 0))) as cong_2_piece_18b_section:
        with BuildLine():
            CenterArc((CONG_2_R, -CONG_2_R), CONG_2_R, 90, 90)
            Line((0, -CONG_2_R), (0, 0))
            Line((0, 0), (CONG_2_R, 0))
        make_face()
    cong_2_piece_18b = extrude(amount=37.5, mode=Mode.PRIVATE)
    cong_2_piece_18b = split(cong_2_piece_18b, bisect_by=Plane(origin=(196, 55, 2), z_dir=(0, 1, 0)), keep=Keep.TOP, mode=Mode.PRIVATE)
    cong_2_piece_18 = cong_2_piece_18a & cong_2_piece_18b
    add(cong_2_piece_18)
    with BuildSketch(Plane(origin=(2, 85, 2), x_dir=(-1, 0, 0), z_dir=(0, 1, 0))) as cong_2_piece_19a_section:
        with BuildLine():
            CenterArc((5, 4), CONG_2_R, 180, 53.130102354)
            Line((0, 4), (0, 0))
            Line((0, 0), (2, 0))
        make_face()
    cong_2_piece_19a = extrude(amount=35, mode=Mode.PRIVATE)
    cong_2_piece_19a = split(cong_2_piece_19a, bisect_by=Plane(origin=(2, 95, 2), z_dir=(0, -1, 0)), keep=Keep.TOP, mode=Mode.PRIVATE)
    with BuildSketch(Plane(origin=(4, 95, 2), x_dir=(0, -1, 0), z_dir=(-1, 0, 0))) as cong_2_piece_19b_section:
        with BuildLine():
            CenterArc((CONG_2_R, CONG_2_R), CONG_2_R, 180, 90)
            Line((0, CONG_2_R), (0, 0))
            Line((0, 0), (CONG_2_R, 0))
        make_face()
    cong_2_piece_19b = extrude(amount=14.5, mode=Mode.PRIVATE)
    cong_2_piece_19b = split(cong_2_piece_19b, bisect_by=Plane(origin=(0, 95, 2), z_dir=(1, 0, 0)), keep=Keep.TOP, mode=Mode.PRIVATE)
    cong_2_piece_19b = split(cong_2_piece_19b, bisect_by=Plane(origin=(2, 95, 2), z_dir=(-1, 0, 0)), keep=Keep.TOP, mode=Mode.PRIVATE)
    cong_2_piece_19 = cong_2_piece_19a & cong_2_piece_19b
    add(cong_2_piece_19)
    with BuildSketch(Plane(origin=(2, 95, 2), x_dir=(-1, 0, 0), z_dir=(0, 1, 0))) as cong_2_piece_20a_section:
        with BuildLine():
            CenterArc((5, 4), CONG_2_R, 180, 53.130102354)
            Line((0, 4), (0, 0))
            Line((0, 0), (2, 0))
        make_face()
    cong_2_piece_20a = extrude(amount=35, mode=Mode.PRIVATE)
    cong_2_piece_20a = split(cong_2_piece_20a, bisect_by=Plane(origin=(2, 120, 2), z_dir=(0, 1, 0)), keep=Keep.TOP, mode=Mode.PRIVATE)
    with BuildSketch(Plane(origin=(-10.5, 120, 2), x_dir=(0, 1, 0), z_dir=(1, 0, 0))) as cong_2_piece_20b_section:
        with BuildLine():
            CenterArc((CONG_2_R, CONG_2_R), CONG_2_R, 180, 90)
            Line((0, CONG_2_R), (0, 0))
            Line((0, 0), (CONG_2_R, 0))
        make_face()
    cong_2_piece_20b = extrude(amount=14.5, mode=Mode.PRIVATE)
    cong_2_piece_20b = split(cong_2_piece_20b, bisect_by=Plane(origin=(0, 120, 2), z_dir=(1, 0, 0)), keep=Keep.TOP, mode=Mode.PRIVATE)
    cong_2_piece_20b = split(cong_2_piece_20b, bisect_by=Plane(origin=(2, 120, 2), z_dir=(-1, 0, 0)), keep=Keep.TOP, mode=Mode.PRIVATE)
    cong_2_piece_20 = cong_2_piece_20a & cong_2_piece_20b
    add(cong_2_piece_20)
    with BuildSketch(Plane(origin=(16.5, 95, 2), x_dir=(0, -1, 0), z_dir=(-1, 0, 0))) as cong_2_piece_21a_section:
        with BuildLine():
            CenterArc((CONG_2_R, CONG_2_R), CONG_2_R, 180, 90)
            Line((0, CONG_2_R), (0, 0))
            Line((0, 0), (CONG_2_R, 0))
        make_face()
    cong_2_piece_21a = extrude(amount=14.5, mode=Mode.PRIVATE)
    cong_2_piece_21a = split(cong_2_piece_21a, bisect_by=Plane(origin=(4, 95, 2), z_dir=(1, 0, 0)), keep=Keep.TOP, mode=Mode.PRIVATE)
    with BuildSketch(Plane(origin=(4, 120, 2), x_dir=(1, 0, 0), z_dir=(0, -1, 0))) as cong_2_piece_21b_section:
        with BuildLine():
            CenterArc((CONG_2_R, CONG_2_R), CONG_2_R, 180, 90)
            Line((0, CONG_2_R), (0, 0))
            Line((0, 0), (CONG_2_R, 0))
        make_face()
    cong_2_piece_21b = extrude(amount=37.5, mode=Mode.PRIVATE)
    cong_2_piece_21b = split(cong_2_piece_21b, bisect_by=Plane(origin=(4, 95, 2), z_dir=(0, -1, 0)), keep=Keep.TOP, mode=Mode.PRIVATE)
    cong_2_piece_21 = cong_2_piece_21a & cong_2_piece_21b
    add(cong_2_piece_21)
    with BuildSketch(Plane(origin=(4, 132.5, 2), x_dir=(1, 0, 0), z_dir=(0, -1, 0))) as cong_2_piece_22a_section:
        with BuildLine():
            CenterArc((CONG_2_R, CONG_2_R), CONG_2_R, 180, 90)
            Line((0, CONG_2_R), (0, 0))
            Line((0, 0), (CONG_2_R, 0))
        make_face()
    cong_2_piece_22a = extrude(amount=37.5, mode=Mode.PRIVATE)
    cong_2_piece_22a = split(cong_2_piece_22a, bisect_by=Plane(origin=(4, 120, 2), z_dir=(0, 1, 0)), keep=Keep.TOP, mode=Mode.PRIVATE)
    with BuildSketch(Plane(origin=(2, 120, 2), x_dir=(0, 1, 0), z_dir=(1, 0, 0))) as cong_2_piece_22b_section:
        with BuildLine():
            CenterArc((CONG_2_R, CONG_2_R), CONG_2_R, 180, 90)
            Line((0, CONG_2_R), (0, 0))
            Line((0, 0), (CONG_2_R, 0))
        make_face()
    cong_2_piece_22b = extrude(amount=14.5, mode=Mode.PRIVATE)
    cong_2_piece_22b = split(cong_2_piece_22b, bisect_by=Plane(origin=(4, 120, 2), z_dir=(1, 0, 0)), keep=Keep.TOP, mode=Mode.PRIVATE)
    cong_2_piece_22 = cong_2_piece_22a & cong_2_piece_22b
    add(cong_2_piece_22)
    # the kernel refuses this fillet: 5 mm, written as the material it takes off along each edge
    with BuildSketch(Plane(origin=(16.5, 30, 17), x_dir=(0, 0, -1), z_dir=(-1, 0, 0)), Plane(origin=(-10.5, 55, 17), x_dir=(0, 0, -1), z_dir=(1, 0, 0)), Plane(origin=(210.5, 120, 17), x_dir=(0, -1, 0), z_dir=(-1, 0, 0)), Plane(origin=(183.5, 95, 17), x_dir=(0, 1, 0), z_dir=(1, 0, 0)), Plane(origin=(183.5, 30, 17), x_dir=(0, 1, 0), z_dir=(1, 0, 0)), Plane(origin=(210.5, 55, 17), x_dir=(0, -1, 0), z_dir=(-1, 0, 0)), Plane(origin=(16.5, 95, 17), x_dir=(0, 0, -1), z_dir=(-1, 0, 0)), Plane(origin=(-10.5, 120, 17), x_dir=(0, 0, -1), z_dir=(1, 0, 0))) as cong_2_2_piece_1:
        with BuildLine():
            CenterArc((CONG_2_R, -CONG_2_R), CONG_2_R, 90, 90)
            Line((0, -CONG_2_R), (0, 0))
            Line((0, 0), (CONG_2_R, 0))
        make_face()
    extrude(amount=27, mode=Mode.SUBTRACT)

    # Esquisse3 → Enlèv. mat.-Extru.1 (cut)
    with BuildSketch(Plane.XY.offset(2)):
        with Locations((2.25, 75)):
            Rectangle(ESQUISSE3_W, ESQUISSE3_H)
        with Locations((197.75, 75)):
            Rectangle(ESQUISSE3_W, ESQUISSE3_H)
    extrude(amount=-ENL_V_MAT_EXTRU_1_DEPTH, mode=Mode.SUBTRACT)

    # Esquisse4 → Boss.-Extru.3 (add)
    # profile 1 of 2: a face of its own
    with BuildSketch(Plane(origin=(0, 0, 0), x_dir=(-1, 0, 0), z_dir=(0, 0, -1))):
        with BuildLine():
            Line((-20, 105), (20, 105))
            ThreePointArc((20, 105), (27.071067812, 102.071067812), (30, 95))
            Line((30, 95), (30, 55))
            ThreePointArc((30, 55), (27.071067812, 47.928932188), (20, 45))
            Line((20, 45), (-20, 45))
            Line((-20, 45), (-20, 105))
        make_face()
        with Locations((15, 90)):
            Circle(ESQUISSE4_R, mode=Mode.SUBTRACT)
        with Locations((15, 60)):
            Circle(ESQUISSE4_R, mode=Mode.SUBTRACT)
    # profile 2 of 2: a face of its own
    with BuildSketch(Plane(origin=(0, 0, 0), x_dir=(-1, 0, 0), z_dir=(0, 0, -1))):
        with BuildLine():
            Line((-180, 45), (-220, 45))
            ThreePointArc((-220, 45), (-227.071067812, 47.928932188), (-230, 55))
            Line((-230, 55), (-230, 95))
            ThreePointArc((-230, 95), (-227.071067812, 102.071067812), (-220, 105))
            Line((-220, 105), (-180, 105))
            Line((-180, 105), (-180, 45))
        make_face()
        with Locations(Location((-215, 60, 0), (0, 0, 180))):
            Circle(ESQUISSE4_R, mode=Mode.SUBTRACT)
        with Locations(Location((-215, 90, 0), (0, 0, 180))):
            Circle(ESQUISSE4_R, mode=Mode.SUBTRACT)
    extrude(amount=-BOSS_EXTRU_3_DEPTH)


solid = part.part
